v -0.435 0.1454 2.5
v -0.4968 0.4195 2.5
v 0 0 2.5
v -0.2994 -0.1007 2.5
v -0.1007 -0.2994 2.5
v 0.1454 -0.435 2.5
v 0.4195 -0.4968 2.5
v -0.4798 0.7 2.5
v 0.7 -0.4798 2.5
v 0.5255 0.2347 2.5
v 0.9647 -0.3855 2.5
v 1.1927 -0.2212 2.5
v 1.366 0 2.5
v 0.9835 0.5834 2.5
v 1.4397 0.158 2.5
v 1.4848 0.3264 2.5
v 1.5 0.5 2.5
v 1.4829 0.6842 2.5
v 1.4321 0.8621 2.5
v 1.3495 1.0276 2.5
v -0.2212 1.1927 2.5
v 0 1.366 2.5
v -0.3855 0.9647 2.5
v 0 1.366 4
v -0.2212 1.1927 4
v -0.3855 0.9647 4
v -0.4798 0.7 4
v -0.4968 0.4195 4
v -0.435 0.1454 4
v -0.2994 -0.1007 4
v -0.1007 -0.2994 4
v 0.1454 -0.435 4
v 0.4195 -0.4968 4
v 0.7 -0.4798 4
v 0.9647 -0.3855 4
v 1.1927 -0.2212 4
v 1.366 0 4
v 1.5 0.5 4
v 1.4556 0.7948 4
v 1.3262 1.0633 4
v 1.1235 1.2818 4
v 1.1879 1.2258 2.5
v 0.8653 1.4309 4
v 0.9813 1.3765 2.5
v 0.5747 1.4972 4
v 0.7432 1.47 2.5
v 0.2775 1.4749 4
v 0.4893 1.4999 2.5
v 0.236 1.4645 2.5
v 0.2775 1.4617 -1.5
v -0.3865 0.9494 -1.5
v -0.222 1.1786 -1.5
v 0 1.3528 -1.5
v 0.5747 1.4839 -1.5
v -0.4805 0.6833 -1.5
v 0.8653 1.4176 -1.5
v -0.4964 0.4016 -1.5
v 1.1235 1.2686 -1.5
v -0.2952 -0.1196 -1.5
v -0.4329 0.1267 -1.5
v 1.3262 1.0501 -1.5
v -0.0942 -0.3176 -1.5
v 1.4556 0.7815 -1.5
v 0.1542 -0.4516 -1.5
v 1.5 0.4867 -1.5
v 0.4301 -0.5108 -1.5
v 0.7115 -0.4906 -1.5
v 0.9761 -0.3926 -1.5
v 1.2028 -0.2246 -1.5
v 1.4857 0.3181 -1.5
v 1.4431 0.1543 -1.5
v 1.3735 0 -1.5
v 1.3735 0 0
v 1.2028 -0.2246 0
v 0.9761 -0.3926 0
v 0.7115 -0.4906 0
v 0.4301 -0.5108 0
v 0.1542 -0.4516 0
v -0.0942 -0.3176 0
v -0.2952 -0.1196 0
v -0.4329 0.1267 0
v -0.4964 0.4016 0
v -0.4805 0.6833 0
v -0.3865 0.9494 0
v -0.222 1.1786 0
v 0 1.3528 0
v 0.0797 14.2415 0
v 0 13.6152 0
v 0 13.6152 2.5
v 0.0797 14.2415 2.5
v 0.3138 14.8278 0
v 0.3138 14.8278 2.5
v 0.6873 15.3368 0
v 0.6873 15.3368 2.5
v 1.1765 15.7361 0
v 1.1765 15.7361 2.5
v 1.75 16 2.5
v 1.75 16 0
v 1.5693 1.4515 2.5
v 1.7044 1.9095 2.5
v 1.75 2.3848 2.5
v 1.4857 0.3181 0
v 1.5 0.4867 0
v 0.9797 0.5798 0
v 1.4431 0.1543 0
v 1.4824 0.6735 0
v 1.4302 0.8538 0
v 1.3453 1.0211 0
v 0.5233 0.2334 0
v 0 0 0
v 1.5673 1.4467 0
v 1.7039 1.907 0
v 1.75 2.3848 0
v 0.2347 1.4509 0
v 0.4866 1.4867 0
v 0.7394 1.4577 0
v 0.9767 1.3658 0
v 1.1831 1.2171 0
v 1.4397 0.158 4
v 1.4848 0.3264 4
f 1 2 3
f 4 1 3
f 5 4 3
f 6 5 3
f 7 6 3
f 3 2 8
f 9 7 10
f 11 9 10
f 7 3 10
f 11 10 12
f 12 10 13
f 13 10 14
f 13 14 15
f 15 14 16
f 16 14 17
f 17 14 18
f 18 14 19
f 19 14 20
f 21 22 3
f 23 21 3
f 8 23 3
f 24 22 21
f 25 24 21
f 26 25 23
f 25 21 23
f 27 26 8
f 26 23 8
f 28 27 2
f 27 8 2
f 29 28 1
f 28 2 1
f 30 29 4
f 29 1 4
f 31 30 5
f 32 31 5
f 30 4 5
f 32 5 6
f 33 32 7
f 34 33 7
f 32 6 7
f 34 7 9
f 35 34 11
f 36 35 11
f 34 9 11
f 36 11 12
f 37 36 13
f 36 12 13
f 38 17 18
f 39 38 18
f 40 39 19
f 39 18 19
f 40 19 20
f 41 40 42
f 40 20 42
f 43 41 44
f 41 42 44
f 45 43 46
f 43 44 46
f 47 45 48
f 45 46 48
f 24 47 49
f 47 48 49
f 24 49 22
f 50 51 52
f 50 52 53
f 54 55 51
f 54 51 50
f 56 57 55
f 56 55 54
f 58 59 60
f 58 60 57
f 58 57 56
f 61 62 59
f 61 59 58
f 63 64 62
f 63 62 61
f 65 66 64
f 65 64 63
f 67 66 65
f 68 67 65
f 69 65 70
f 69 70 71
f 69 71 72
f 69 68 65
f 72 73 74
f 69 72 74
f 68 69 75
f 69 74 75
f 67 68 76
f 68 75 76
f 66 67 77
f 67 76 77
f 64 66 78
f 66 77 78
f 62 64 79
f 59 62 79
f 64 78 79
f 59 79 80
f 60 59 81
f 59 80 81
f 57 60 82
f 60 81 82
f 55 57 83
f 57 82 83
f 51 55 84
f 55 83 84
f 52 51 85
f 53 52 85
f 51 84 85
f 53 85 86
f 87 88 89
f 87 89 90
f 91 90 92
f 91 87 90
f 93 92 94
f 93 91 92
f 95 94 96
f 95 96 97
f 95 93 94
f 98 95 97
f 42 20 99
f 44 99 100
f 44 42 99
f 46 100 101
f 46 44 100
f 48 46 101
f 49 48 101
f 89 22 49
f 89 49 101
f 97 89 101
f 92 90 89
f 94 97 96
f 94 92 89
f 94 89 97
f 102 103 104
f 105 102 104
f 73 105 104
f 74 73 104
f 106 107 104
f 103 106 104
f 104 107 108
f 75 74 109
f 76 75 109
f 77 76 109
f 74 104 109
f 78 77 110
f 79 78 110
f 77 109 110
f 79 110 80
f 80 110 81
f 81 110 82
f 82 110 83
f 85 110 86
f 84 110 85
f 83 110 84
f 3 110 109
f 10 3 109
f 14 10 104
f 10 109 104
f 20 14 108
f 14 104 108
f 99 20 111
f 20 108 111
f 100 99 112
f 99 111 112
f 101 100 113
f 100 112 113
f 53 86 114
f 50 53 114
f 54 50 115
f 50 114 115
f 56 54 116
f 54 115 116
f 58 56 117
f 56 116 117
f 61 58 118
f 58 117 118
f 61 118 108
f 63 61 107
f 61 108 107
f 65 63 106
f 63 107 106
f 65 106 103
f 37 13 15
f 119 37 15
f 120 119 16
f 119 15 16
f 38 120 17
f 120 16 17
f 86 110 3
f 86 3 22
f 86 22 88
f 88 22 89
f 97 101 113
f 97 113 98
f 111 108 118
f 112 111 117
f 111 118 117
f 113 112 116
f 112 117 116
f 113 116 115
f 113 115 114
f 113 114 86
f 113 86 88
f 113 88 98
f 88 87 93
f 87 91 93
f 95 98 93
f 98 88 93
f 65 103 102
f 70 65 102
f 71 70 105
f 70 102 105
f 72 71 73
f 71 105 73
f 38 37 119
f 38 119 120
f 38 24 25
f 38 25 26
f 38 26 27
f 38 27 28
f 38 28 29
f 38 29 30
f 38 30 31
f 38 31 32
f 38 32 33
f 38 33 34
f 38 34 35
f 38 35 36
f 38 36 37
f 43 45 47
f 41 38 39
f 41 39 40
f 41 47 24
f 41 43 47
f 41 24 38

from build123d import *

# Parameters (mm, degrees)
F0_W        = 16
F0_H        = 2.5
F1_DEPTH    = 1.75
F4_DEPTH    = 1.5
F5_DEPTH    = 1.5
F6_T1_DEPTH = 14.4242400177
F6_T3_DEPTH = 2.5


# Not quite as in the source:
# - a fillet or chamfer that OpenCascade refuses, or shapes differently, is made with other operations: its cross-section is extruded or revolved along the edge and cut away or added


with BuildPart() as f1:
    # F0 (on Right) → F1 (new body)
    with BuildSketch(Plane.YZ):
        with Locations((8, 1.25)):
            Rectangle(F0_W, F0_H)
    extrude(amount=F1_DEPTH)

    # F3 (on face) → F4 (join)
    with BuildSketch(Plane.XY.offset(2.5)):
        with BuildLine():
            ThreePointArc((1.3660254038, 0), (1.4659258263, 0.2411809549), (1.5, 0.5))
            ThreePointArc((1.5, 0.5), (1, 1.3660254038), (0, 1.3660254038))
            Line((0, 1.3660254038), (0, 0))
            Line((0, 0), (1.3660254038, 0))
        make_face()
        with BuildLine():
            Line((0, 0), (0, 1.3660254038))
            ThreePointArc((0, 1.3660254038), (-0.2071067812, -0.2071067812), (1.3660254038, 0))
            Line((1.3660254038, 0), (0, 0))
        make_face()
    extrude(amount=F4_DEPTH)

    # F2 (on face) → F5 (join)
    with BuildSketch(Plane(origin=(0, 0, 0), x_dir=(1, 0, 0), z_dir=(0, 0, -1))):
        with BuildLine():
            ThreePointArc((0, -1.3527675268), (1, -1.3527675268), (1.5, -0.486742123))
            ThreePointArc((1.5, -0.486742123), (1.4678702674, -0.2352920375), (1.373545709, 0))
            Line((1.373545709, 0), (0, 0))
            Line((0, 0), (0, -1.3527675268))
        make_face()
        with BuildLine():
            Line((0, 0), (1.373545709, 0))
            ThreePointArc((1.373545709, 0), (-0.2016972955, 0.2257330733), (0, -1.3527675268))
            Line((0, -1.3527675268), (0, 0))
        make_face()
    extrude(amount=F5_DEPTH)

    # F6: fillet of radius 2.5 on 2 edges, made by hand

    # F6_s2 → F6_t1 (cut)
    with BuildSketch(Plane.XY.offset(-5.9621200089)):
        with BuildLine():
            ThreePointArc((0, 13.6151519965), (0.4844355629, 15.0941719422), (1.75, 16))
            Line((1.75, 16), (0, 16))
            Line((0, 16), (0, 13.6151519965))
        make_face()
    extrude(amount=F6_T1_DEPTH, mode=Mode.SUBTRACT)

    # F6_s4 → F6_t3 (cut)
    with BuildSketch(Plane.XY):
        with BuildLine():
            ThreePointArc((0, 0), (1.2655644371, 0.9058280578), (1.75, 2.3848480035))
            Line((1.75, 2.3848480035), (1.75, 0))
            Line((1.75, 0), (0, 0))
        make_face()
    extrude(amount=F6_T3_DEPTH, mode=Mode.SUBTRACT)


solid = f1.part
